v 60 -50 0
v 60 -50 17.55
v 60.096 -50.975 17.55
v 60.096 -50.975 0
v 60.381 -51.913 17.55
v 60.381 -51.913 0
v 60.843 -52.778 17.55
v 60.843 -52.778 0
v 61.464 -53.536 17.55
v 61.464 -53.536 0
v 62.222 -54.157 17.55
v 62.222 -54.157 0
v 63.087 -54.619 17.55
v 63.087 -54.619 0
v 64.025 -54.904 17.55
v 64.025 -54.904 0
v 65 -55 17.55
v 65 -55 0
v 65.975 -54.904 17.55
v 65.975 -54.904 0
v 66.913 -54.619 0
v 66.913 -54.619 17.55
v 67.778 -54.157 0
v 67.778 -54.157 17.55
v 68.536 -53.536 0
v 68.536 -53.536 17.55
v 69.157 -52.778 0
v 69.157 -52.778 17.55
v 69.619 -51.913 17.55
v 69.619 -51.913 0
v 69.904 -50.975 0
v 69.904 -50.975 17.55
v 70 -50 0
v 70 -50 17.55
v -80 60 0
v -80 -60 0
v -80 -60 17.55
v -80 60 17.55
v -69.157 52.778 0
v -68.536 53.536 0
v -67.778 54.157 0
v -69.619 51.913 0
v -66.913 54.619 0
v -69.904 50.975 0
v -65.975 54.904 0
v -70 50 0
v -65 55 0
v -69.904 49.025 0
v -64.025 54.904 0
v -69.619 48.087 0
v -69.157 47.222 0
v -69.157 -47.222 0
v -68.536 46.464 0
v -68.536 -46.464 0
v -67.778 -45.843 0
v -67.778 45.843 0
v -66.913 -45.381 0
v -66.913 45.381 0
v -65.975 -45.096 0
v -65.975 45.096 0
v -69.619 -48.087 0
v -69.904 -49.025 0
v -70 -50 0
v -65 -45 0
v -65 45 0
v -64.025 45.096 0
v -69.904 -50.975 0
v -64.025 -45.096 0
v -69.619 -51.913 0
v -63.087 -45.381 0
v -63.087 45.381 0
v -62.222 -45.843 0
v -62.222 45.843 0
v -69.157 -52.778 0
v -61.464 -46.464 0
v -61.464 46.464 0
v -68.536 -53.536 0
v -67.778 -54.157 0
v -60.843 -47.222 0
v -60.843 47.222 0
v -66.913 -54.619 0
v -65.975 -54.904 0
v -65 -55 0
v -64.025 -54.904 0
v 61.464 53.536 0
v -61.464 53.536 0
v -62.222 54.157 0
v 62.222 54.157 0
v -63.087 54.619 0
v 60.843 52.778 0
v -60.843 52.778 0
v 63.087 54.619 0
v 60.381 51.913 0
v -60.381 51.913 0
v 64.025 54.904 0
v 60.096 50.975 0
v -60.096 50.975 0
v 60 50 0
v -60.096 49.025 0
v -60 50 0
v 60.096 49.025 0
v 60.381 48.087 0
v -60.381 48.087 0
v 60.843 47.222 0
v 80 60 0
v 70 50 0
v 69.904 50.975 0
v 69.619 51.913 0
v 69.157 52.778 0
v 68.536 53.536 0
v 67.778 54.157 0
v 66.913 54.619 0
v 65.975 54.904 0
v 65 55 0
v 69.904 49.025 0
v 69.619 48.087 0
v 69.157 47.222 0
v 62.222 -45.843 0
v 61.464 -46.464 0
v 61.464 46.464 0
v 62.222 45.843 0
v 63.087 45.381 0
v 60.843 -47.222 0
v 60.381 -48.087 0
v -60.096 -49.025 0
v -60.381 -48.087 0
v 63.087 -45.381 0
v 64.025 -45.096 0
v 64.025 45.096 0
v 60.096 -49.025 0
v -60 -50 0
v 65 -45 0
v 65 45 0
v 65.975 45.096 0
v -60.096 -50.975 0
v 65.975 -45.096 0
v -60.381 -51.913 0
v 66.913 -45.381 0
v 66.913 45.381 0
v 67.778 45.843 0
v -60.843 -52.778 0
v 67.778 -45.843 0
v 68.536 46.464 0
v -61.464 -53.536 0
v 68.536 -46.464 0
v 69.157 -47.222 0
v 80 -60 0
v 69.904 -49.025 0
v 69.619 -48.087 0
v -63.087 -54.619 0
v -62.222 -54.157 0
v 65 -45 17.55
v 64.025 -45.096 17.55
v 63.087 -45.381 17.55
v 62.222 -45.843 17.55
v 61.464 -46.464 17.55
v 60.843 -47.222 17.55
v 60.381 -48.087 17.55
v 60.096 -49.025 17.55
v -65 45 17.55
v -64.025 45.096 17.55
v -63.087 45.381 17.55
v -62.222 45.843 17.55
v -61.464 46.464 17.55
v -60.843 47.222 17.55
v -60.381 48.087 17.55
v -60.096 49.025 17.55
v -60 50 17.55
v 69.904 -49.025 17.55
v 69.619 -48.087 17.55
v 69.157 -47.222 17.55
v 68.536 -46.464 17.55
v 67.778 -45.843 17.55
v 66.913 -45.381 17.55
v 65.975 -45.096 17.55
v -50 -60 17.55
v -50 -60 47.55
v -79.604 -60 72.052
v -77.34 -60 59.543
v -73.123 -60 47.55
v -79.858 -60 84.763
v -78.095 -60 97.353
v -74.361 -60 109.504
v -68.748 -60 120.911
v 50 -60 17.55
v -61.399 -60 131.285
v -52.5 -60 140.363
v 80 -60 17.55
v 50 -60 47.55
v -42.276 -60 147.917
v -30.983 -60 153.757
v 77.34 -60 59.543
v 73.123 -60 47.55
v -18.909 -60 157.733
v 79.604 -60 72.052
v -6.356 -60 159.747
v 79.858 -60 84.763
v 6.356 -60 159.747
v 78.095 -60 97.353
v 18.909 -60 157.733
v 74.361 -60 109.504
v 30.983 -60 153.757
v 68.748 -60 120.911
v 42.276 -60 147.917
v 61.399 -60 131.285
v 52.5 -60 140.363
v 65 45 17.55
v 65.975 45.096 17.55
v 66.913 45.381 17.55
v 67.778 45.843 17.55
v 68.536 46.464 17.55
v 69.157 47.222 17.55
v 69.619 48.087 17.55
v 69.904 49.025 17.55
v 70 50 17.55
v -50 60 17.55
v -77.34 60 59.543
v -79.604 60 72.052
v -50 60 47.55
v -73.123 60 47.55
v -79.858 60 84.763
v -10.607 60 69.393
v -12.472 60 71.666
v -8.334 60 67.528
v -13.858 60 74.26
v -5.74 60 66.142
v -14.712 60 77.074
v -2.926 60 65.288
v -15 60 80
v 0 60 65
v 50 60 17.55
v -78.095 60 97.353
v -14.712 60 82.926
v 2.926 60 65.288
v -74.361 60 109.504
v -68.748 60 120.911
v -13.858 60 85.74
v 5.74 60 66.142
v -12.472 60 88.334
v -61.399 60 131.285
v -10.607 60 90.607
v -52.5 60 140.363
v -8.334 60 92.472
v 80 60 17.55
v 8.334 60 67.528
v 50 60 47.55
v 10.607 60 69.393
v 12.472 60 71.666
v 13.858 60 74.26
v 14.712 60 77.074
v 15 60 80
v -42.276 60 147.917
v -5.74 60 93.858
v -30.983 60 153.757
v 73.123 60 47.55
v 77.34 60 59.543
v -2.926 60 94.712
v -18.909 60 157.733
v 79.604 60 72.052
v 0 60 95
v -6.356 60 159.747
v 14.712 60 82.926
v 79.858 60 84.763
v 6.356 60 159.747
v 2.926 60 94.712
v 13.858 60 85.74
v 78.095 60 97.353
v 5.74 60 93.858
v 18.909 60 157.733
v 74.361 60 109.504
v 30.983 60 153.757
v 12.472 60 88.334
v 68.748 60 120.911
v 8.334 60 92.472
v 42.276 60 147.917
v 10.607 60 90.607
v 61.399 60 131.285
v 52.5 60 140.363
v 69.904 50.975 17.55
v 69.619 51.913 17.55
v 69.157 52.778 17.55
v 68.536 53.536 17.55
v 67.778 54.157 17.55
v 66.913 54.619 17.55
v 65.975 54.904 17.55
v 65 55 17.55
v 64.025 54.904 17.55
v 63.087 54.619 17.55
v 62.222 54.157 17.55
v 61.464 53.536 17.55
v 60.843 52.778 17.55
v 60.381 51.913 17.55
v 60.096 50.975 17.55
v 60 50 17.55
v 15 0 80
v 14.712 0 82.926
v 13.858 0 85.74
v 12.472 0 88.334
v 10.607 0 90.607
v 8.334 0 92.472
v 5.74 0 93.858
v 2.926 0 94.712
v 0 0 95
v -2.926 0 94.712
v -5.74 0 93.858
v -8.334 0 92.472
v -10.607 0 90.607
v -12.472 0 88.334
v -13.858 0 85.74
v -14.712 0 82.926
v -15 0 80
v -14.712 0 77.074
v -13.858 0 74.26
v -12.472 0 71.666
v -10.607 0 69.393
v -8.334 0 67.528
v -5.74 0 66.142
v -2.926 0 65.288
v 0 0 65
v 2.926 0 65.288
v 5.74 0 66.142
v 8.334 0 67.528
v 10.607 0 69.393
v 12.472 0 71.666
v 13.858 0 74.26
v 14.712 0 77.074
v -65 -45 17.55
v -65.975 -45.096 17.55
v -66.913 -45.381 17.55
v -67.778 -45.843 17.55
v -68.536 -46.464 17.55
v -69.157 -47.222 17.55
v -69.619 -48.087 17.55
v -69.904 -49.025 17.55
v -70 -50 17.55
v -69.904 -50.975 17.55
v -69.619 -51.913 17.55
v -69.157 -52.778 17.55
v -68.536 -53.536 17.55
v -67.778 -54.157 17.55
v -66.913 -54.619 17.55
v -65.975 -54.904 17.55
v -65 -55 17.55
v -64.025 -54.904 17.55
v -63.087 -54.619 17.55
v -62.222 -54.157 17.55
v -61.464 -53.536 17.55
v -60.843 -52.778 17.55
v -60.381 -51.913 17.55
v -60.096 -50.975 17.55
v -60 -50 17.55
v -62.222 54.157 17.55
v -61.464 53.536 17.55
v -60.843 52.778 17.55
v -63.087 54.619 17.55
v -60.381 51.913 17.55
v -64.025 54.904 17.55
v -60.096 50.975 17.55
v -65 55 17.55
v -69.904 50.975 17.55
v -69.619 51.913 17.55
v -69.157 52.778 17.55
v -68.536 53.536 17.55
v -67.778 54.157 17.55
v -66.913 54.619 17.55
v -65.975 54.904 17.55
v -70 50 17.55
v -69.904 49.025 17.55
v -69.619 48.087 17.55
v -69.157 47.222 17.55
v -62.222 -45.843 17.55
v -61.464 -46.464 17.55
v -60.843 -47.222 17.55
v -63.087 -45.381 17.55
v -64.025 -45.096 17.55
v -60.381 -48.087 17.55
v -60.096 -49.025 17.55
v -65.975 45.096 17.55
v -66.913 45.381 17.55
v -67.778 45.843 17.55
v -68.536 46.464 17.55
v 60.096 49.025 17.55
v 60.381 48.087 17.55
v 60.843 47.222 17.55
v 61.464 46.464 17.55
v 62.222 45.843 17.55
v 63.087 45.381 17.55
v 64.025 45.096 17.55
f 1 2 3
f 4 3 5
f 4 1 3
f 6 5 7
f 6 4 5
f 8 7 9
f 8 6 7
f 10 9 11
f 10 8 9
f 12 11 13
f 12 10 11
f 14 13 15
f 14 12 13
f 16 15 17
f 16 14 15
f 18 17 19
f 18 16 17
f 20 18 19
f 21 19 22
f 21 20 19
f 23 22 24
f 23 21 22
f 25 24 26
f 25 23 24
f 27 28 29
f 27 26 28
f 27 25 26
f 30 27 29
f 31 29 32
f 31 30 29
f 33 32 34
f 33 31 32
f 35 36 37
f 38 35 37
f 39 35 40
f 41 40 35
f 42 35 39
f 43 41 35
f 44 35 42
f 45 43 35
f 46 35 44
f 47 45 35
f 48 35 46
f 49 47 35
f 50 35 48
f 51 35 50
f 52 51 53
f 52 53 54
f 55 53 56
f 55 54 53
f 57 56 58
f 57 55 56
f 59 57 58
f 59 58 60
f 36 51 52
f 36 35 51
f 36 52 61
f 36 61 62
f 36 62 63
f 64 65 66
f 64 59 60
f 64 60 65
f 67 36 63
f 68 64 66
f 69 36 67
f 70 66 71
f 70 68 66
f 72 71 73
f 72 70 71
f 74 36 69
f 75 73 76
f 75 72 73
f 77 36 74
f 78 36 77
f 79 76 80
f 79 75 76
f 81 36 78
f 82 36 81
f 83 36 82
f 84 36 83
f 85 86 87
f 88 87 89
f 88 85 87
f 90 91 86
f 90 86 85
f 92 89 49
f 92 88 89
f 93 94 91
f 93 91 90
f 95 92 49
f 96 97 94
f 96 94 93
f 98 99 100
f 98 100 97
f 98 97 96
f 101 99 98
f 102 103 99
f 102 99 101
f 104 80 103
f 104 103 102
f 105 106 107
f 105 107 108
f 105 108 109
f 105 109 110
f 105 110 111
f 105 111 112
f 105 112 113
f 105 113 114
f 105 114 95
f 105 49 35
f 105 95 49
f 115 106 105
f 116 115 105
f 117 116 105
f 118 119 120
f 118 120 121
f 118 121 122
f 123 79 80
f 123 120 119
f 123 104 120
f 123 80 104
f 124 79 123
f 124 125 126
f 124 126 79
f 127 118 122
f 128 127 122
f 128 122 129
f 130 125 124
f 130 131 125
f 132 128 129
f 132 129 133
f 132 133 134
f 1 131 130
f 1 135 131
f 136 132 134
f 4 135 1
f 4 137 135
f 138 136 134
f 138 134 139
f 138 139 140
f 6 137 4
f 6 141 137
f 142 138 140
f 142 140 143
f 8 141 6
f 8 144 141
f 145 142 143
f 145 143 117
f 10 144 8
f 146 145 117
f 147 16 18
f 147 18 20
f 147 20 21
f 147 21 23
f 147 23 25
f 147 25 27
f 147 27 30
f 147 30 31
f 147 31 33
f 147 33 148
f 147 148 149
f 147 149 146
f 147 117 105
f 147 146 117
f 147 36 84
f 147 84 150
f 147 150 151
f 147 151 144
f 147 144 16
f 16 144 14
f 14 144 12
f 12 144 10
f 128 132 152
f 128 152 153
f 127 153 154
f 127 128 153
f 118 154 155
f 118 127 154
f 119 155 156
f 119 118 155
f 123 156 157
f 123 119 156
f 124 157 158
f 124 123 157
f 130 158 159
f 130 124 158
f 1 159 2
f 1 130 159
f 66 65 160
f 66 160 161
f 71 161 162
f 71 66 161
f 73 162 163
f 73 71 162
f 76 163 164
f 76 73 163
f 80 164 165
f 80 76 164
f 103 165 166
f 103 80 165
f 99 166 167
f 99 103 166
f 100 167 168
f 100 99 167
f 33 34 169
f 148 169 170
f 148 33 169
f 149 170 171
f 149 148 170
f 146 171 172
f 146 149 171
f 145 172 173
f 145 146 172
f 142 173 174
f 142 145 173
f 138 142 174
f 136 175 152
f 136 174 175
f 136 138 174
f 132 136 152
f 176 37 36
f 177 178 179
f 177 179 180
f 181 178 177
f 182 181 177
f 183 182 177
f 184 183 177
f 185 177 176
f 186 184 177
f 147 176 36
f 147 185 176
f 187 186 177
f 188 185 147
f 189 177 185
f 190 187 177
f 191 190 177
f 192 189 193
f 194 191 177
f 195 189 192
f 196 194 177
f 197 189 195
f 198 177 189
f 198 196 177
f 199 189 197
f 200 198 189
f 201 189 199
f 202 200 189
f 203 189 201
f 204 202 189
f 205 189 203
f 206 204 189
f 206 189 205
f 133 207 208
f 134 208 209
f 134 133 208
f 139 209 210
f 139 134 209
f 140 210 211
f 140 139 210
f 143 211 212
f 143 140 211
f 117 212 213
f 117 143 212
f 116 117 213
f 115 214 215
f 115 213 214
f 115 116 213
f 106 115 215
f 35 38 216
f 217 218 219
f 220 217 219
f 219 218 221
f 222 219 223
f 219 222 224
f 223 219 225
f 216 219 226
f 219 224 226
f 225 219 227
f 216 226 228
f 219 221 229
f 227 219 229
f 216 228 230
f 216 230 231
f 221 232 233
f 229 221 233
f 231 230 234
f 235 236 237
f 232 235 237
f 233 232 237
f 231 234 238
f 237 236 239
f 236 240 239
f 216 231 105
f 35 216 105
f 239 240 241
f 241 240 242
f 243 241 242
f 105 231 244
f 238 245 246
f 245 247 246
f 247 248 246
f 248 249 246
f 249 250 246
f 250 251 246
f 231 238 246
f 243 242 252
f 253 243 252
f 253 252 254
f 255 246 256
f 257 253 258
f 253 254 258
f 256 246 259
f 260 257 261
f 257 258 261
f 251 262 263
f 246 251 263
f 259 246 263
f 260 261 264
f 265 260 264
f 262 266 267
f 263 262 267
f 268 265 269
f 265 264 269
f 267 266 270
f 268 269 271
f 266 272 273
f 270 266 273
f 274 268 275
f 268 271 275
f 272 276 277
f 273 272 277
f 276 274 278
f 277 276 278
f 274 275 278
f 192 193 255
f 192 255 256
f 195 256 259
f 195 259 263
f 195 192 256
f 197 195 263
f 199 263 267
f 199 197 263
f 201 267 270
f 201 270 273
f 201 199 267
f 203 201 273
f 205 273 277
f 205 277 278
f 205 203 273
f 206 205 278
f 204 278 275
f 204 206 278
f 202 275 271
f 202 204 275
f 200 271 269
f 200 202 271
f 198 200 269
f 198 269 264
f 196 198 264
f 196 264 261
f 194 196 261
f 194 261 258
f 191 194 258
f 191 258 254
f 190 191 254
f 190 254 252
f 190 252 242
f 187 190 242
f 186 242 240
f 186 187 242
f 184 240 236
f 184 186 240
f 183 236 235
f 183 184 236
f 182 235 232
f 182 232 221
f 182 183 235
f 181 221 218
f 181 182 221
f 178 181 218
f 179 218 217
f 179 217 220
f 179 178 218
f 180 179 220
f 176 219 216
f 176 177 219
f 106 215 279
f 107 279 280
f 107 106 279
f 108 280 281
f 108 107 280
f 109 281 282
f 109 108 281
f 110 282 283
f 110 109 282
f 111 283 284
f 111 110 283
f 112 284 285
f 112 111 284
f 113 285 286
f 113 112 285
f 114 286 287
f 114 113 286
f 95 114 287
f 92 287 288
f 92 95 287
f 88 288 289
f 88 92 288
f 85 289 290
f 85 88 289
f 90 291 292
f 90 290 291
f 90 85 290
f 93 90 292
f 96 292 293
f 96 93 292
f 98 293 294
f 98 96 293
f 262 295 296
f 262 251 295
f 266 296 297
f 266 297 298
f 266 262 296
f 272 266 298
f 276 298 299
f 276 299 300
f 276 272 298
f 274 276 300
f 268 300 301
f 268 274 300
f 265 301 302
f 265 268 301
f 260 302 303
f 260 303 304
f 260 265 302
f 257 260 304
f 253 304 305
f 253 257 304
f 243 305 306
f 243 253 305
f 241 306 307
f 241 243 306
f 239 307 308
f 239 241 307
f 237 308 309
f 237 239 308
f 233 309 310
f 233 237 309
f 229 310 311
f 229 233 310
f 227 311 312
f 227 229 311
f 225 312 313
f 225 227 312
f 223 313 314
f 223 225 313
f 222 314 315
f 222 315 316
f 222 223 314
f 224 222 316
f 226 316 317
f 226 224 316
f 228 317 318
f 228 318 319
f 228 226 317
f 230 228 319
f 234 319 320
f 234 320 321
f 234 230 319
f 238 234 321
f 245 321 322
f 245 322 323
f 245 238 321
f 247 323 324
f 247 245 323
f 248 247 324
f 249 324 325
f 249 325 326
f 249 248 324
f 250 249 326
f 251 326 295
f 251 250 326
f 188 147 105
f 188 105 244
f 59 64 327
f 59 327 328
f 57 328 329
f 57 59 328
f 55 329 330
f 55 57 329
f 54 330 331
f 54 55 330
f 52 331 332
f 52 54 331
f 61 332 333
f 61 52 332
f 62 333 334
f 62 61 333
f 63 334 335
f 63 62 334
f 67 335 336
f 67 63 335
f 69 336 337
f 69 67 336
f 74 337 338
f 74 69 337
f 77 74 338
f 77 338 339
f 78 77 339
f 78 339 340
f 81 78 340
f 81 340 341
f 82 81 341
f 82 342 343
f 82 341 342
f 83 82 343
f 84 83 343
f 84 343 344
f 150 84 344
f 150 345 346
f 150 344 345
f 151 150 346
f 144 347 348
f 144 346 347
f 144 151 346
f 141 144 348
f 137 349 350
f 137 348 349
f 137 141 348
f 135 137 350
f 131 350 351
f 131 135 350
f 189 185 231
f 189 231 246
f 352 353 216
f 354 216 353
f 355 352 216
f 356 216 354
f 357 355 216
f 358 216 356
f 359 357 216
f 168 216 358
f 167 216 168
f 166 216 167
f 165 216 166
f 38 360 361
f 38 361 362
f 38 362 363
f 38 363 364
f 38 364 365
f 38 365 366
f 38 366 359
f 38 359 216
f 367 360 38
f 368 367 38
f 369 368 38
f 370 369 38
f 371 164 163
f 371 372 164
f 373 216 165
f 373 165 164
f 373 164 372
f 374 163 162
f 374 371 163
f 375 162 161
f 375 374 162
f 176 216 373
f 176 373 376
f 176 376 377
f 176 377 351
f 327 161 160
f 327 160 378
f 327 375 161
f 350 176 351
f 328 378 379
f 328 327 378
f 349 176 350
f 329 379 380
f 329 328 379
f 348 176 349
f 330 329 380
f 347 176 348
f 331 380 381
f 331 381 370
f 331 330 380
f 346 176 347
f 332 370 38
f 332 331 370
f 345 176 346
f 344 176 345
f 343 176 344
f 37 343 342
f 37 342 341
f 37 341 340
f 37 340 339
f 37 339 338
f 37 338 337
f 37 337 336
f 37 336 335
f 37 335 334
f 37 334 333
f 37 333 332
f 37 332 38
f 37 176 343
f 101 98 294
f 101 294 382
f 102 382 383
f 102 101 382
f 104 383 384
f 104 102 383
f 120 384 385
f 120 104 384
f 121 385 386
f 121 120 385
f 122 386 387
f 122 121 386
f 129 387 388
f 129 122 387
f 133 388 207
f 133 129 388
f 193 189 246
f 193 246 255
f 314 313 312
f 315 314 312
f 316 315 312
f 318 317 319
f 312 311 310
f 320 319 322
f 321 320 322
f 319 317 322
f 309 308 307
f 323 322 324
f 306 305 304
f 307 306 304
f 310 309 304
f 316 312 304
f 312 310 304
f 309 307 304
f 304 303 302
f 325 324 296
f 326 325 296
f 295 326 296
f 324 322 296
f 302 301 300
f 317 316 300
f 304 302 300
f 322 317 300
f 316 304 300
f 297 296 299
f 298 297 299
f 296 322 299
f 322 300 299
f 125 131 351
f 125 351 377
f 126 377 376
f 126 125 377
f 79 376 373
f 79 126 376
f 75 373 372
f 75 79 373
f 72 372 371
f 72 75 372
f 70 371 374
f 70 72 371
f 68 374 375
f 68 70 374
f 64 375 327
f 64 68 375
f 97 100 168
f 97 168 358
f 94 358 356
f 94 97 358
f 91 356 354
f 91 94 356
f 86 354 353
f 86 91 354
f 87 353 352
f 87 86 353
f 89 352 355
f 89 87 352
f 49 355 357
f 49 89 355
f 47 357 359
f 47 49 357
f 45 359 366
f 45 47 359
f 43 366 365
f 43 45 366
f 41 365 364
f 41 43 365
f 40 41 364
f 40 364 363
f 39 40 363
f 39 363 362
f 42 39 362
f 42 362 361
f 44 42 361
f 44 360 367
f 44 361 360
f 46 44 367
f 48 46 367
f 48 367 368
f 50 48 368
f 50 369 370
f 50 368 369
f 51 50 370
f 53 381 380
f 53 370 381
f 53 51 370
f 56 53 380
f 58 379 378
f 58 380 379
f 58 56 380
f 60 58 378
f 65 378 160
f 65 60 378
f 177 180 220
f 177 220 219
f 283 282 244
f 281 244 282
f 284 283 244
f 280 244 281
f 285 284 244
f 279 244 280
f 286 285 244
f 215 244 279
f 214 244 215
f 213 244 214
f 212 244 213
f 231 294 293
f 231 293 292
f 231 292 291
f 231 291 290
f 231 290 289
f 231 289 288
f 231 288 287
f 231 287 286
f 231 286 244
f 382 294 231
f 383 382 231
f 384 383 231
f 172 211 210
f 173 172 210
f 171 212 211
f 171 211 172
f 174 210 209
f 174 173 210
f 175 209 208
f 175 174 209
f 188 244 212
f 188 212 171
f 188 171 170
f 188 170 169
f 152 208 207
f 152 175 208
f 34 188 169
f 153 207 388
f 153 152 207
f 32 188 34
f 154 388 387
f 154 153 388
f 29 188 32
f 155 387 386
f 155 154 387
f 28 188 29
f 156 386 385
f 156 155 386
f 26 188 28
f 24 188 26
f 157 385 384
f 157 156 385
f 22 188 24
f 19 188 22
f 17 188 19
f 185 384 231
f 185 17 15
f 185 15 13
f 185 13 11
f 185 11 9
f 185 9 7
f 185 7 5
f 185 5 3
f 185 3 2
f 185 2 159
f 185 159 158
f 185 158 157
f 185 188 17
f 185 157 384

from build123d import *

# Parameters (mm, degrees)
F0_W     = 15
F0_H     = 17.55002
F0_R     = 15
F2_DEPTH = 60
F3_DEPTH = 25
F4_DEPTH = 60


with BuildPart() as f2:
    # F0 (on Front) → F2 (new body, symmetric)
    with BuildSketch(Plane.XZ):
        with Locations((-72.5, 8.77501)):
            Rectangle(F0_W, F0_H)
        with BuildLine():
            Line((-65, 0), (0, 0))
            ThreePointArc((0, 0), (-26.495298, 4.514907), (-50, 17.55002))
            Line((-50, 17.55002), (-65, 17.55002))
            Line((-65, 17.55002), (-65, 0))
        make_face()
        with BuildLine():
            ThreePointArc((-50, 17.55002), (-26.495298, 4.514907), (0, 0))
            ThreePointArc((0, 0), (26.495298, 4.514907), (50, 17.55002))
            Line((50, 17.55002), (50, 47.55002))
            Line((50, 47.55002), (73.123176, 47.55002))
            ThreePointArc((73.123176, 47.55002), (0, 160), (-73.123176, 47.55002))
            Line((-73.123176, 47.55002), (-50, 47.55002))
            Line((-50, 47.55002), (-50, 17.55002))
        make_face()
        with Locations((0, 80)):
            Circle(F0_R, mode=Mode.SUBTRACT)
        with BuildLine():
            ThreePointArc((50, 17.55002), (26.495298, 4.514907), (0, 0))
            Line((0, 0), (65, 0))
            Line((65, 0), (65, 17.55002))
            Line((65, 17.55002), (50, 17.55002))
        make_face()
        with Locations((72.5, 8.77501)):
            Rectangle(F0_W, F0_H)
    extrude(amount=F2_DEPTH, both=True)

    # F1 (on Top) → F3 (cut)
    with BuildSketch(Plane.XY):
        with BuildLine():
            ThreePointArc((-60, 50), (-68.535534, 53.535534), (-65, 45))
            Line((-65, 45), (-65, 50))
            Line((-65, 50), (-60, 50))
        make_face()
        with BuildLine():
            Line((-65, 50), (-65, 45))
            ThreePointArc((-65, 45), (-61.464466, 46.464466), (-60, 50))
            Line((-60, 50), (-65, 50))
        make_face()
        with BuildLine():
            Line((-65, -45), (-65, -50))
            Line((-65, -50), (-60, -50))
            ThreePointArc((-60, -50), (-61.464466, -46.464466), (-65, -45))
        make_face()
        with BuildLine():
            Line((-60, -50), (-65, -50))
            Line((-65, -50), (-65, -45))
            ThreePointArc((-65, -45), (-68.535534, -53.535534), (-60, -50))
        make_face()
        with BuildLine():
            ThreePointArc((60, 50), (61.464466, 46.464466), (65, 45))
            Line((65, 45), (65, 50))
            Line((65, 50), (60, 50))
        make_face()
        with BuildLine():
            Line((65, 50), (65, 45))
            ThreePointArc((65, 45), (68.535534, 46.464466), (70, 50))
            ThreePointArc((70, 50), (65, 55), (60, 50))
            Line((60, 50), (65, 50))
        make_face()
        with BuildLine():
            Line((65, -50), (60, -50))
            ThreePointArc((60, -50), (65, -55), (70, -50))
            ThreePointArc((70, -50), (68.535534, -46.464466), (65, -45))
            Line((65, -45), (65, -50))
        make_face()
        with BuildLine():
            ThreePointArc((65, -45), (61.464466, -46.464466), (60, -50))
            Line((60, -50), (65, -50))
            Line((65, -50), (65, -45))
        make_face()
    extrude(amount=F3_DEPTH, mode=Mode.SUBTRACT)

    # F0 (on Front) → F4 (join, through all)
    with BuildSketch(Plane.XZ):
        with Locations((0, 80)):
            Circle(F0_R)
    extrude(amount=F4_DEPTH)


solid = f2.part
